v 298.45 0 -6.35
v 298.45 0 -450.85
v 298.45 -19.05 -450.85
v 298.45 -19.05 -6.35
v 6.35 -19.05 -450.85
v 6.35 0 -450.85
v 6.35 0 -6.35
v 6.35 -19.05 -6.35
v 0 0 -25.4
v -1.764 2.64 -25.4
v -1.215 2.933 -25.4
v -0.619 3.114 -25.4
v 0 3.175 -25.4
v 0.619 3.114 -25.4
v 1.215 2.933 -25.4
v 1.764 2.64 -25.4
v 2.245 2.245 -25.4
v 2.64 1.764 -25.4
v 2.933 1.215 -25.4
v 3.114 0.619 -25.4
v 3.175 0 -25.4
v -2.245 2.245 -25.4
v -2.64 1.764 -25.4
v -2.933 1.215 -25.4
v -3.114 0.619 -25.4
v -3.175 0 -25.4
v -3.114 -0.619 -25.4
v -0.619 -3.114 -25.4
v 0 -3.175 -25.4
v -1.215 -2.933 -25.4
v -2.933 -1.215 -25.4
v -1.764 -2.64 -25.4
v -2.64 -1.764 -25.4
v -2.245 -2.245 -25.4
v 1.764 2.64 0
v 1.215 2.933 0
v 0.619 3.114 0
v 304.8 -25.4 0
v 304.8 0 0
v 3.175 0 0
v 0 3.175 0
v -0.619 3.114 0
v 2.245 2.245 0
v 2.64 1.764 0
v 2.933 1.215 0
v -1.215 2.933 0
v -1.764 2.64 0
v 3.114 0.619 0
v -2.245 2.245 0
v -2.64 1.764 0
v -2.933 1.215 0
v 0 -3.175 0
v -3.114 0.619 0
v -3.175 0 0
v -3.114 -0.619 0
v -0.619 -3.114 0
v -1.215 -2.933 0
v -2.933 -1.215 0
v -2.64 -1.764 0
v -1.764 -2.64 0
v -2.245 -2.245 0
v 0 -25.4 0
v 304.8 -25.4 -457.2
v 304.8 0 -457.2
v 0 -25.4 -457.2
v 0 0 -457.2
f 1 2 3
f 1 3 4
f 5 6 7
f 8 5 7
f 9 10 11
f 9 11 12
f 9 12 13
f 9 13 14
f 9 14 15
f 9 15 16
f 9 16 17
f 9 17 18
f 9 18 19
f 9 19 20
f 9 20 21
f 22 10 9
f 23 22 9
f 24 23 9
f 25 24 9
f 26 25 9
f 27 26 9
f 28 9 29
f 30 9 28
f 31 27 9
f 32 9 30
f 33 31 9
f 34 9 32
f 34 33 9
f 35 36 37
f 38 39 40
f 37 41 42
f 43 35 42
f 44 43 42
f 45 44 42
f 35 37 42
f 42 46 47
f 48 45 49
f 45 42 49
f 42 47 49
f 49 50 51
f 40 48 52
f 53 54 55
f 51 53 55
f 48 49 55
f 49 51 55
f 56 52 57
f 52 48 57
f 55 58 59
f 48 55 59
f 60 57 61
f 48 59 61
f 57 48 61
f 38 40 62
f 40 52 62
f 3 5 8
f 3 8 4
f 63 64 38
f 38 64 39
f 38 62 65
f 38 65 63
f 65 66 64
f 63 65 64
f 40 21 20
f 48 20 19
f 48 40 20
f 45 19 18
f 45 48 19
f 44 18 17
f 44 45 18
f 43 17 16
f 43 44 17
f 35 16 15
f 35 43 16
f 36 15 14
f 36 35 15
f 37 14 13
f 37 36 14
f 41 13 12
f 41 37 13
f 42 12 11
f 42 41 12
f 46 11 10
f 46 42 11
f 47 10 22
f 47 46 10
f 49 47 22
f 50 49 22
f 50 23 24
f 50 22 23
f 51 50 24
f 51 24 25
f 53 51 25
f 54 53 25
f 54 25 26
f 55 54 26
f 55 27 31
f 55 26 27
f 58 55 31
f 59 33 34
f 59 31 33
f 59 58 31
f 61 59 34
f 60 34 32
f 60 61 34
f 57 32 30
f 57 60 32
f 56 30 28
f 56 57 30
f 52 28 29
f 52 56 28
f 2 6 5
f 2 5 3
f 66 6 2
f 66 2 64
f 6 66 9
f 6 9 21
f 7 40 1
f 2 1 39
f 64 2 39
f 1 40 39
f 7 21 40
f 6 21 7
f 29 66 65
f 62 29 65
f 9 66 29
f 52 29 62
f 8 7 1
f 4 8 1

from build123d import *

# Parameters (mm, degrees)
F0_W     = 304.8
F0_H     = 457.2
F2_DEPTH = 25.4
F3_T     = -6.35
F4_W     = 3.175
F4_H     = 25.4


# Not quite as in the source:
# - the program builds the solid bodies; features that only make, move or delete a surface that nothing else refers to are left out


with BuildPart() as f2:
    # F0 (on Front) → F2 (new body)
    with BuildSketch(Plane.XZ):
        with Locations((152.4, -228.6)):
            Rectangle(F0_W, F0_H)
    extrude(amount=F2_DEPTH)

    # F3
    f3_openings = [f2.faces().sort_by_distance(p)[0] for p in [
        (152.4, 0, -228.6),
    ]]
    offset(amount=F3_T, openings=f3_openings)

    # F4 (on Right) → F5 (revolve)
    with BuildSketch(Plane.YZ):
        with Locations((1.5875, -12.7)):
            Rectangle(F4_W, F4_H)
    revolve(axis=Axis((0, 0, 39.7453531623), (0, 0, 1)))


solid = f2.part
